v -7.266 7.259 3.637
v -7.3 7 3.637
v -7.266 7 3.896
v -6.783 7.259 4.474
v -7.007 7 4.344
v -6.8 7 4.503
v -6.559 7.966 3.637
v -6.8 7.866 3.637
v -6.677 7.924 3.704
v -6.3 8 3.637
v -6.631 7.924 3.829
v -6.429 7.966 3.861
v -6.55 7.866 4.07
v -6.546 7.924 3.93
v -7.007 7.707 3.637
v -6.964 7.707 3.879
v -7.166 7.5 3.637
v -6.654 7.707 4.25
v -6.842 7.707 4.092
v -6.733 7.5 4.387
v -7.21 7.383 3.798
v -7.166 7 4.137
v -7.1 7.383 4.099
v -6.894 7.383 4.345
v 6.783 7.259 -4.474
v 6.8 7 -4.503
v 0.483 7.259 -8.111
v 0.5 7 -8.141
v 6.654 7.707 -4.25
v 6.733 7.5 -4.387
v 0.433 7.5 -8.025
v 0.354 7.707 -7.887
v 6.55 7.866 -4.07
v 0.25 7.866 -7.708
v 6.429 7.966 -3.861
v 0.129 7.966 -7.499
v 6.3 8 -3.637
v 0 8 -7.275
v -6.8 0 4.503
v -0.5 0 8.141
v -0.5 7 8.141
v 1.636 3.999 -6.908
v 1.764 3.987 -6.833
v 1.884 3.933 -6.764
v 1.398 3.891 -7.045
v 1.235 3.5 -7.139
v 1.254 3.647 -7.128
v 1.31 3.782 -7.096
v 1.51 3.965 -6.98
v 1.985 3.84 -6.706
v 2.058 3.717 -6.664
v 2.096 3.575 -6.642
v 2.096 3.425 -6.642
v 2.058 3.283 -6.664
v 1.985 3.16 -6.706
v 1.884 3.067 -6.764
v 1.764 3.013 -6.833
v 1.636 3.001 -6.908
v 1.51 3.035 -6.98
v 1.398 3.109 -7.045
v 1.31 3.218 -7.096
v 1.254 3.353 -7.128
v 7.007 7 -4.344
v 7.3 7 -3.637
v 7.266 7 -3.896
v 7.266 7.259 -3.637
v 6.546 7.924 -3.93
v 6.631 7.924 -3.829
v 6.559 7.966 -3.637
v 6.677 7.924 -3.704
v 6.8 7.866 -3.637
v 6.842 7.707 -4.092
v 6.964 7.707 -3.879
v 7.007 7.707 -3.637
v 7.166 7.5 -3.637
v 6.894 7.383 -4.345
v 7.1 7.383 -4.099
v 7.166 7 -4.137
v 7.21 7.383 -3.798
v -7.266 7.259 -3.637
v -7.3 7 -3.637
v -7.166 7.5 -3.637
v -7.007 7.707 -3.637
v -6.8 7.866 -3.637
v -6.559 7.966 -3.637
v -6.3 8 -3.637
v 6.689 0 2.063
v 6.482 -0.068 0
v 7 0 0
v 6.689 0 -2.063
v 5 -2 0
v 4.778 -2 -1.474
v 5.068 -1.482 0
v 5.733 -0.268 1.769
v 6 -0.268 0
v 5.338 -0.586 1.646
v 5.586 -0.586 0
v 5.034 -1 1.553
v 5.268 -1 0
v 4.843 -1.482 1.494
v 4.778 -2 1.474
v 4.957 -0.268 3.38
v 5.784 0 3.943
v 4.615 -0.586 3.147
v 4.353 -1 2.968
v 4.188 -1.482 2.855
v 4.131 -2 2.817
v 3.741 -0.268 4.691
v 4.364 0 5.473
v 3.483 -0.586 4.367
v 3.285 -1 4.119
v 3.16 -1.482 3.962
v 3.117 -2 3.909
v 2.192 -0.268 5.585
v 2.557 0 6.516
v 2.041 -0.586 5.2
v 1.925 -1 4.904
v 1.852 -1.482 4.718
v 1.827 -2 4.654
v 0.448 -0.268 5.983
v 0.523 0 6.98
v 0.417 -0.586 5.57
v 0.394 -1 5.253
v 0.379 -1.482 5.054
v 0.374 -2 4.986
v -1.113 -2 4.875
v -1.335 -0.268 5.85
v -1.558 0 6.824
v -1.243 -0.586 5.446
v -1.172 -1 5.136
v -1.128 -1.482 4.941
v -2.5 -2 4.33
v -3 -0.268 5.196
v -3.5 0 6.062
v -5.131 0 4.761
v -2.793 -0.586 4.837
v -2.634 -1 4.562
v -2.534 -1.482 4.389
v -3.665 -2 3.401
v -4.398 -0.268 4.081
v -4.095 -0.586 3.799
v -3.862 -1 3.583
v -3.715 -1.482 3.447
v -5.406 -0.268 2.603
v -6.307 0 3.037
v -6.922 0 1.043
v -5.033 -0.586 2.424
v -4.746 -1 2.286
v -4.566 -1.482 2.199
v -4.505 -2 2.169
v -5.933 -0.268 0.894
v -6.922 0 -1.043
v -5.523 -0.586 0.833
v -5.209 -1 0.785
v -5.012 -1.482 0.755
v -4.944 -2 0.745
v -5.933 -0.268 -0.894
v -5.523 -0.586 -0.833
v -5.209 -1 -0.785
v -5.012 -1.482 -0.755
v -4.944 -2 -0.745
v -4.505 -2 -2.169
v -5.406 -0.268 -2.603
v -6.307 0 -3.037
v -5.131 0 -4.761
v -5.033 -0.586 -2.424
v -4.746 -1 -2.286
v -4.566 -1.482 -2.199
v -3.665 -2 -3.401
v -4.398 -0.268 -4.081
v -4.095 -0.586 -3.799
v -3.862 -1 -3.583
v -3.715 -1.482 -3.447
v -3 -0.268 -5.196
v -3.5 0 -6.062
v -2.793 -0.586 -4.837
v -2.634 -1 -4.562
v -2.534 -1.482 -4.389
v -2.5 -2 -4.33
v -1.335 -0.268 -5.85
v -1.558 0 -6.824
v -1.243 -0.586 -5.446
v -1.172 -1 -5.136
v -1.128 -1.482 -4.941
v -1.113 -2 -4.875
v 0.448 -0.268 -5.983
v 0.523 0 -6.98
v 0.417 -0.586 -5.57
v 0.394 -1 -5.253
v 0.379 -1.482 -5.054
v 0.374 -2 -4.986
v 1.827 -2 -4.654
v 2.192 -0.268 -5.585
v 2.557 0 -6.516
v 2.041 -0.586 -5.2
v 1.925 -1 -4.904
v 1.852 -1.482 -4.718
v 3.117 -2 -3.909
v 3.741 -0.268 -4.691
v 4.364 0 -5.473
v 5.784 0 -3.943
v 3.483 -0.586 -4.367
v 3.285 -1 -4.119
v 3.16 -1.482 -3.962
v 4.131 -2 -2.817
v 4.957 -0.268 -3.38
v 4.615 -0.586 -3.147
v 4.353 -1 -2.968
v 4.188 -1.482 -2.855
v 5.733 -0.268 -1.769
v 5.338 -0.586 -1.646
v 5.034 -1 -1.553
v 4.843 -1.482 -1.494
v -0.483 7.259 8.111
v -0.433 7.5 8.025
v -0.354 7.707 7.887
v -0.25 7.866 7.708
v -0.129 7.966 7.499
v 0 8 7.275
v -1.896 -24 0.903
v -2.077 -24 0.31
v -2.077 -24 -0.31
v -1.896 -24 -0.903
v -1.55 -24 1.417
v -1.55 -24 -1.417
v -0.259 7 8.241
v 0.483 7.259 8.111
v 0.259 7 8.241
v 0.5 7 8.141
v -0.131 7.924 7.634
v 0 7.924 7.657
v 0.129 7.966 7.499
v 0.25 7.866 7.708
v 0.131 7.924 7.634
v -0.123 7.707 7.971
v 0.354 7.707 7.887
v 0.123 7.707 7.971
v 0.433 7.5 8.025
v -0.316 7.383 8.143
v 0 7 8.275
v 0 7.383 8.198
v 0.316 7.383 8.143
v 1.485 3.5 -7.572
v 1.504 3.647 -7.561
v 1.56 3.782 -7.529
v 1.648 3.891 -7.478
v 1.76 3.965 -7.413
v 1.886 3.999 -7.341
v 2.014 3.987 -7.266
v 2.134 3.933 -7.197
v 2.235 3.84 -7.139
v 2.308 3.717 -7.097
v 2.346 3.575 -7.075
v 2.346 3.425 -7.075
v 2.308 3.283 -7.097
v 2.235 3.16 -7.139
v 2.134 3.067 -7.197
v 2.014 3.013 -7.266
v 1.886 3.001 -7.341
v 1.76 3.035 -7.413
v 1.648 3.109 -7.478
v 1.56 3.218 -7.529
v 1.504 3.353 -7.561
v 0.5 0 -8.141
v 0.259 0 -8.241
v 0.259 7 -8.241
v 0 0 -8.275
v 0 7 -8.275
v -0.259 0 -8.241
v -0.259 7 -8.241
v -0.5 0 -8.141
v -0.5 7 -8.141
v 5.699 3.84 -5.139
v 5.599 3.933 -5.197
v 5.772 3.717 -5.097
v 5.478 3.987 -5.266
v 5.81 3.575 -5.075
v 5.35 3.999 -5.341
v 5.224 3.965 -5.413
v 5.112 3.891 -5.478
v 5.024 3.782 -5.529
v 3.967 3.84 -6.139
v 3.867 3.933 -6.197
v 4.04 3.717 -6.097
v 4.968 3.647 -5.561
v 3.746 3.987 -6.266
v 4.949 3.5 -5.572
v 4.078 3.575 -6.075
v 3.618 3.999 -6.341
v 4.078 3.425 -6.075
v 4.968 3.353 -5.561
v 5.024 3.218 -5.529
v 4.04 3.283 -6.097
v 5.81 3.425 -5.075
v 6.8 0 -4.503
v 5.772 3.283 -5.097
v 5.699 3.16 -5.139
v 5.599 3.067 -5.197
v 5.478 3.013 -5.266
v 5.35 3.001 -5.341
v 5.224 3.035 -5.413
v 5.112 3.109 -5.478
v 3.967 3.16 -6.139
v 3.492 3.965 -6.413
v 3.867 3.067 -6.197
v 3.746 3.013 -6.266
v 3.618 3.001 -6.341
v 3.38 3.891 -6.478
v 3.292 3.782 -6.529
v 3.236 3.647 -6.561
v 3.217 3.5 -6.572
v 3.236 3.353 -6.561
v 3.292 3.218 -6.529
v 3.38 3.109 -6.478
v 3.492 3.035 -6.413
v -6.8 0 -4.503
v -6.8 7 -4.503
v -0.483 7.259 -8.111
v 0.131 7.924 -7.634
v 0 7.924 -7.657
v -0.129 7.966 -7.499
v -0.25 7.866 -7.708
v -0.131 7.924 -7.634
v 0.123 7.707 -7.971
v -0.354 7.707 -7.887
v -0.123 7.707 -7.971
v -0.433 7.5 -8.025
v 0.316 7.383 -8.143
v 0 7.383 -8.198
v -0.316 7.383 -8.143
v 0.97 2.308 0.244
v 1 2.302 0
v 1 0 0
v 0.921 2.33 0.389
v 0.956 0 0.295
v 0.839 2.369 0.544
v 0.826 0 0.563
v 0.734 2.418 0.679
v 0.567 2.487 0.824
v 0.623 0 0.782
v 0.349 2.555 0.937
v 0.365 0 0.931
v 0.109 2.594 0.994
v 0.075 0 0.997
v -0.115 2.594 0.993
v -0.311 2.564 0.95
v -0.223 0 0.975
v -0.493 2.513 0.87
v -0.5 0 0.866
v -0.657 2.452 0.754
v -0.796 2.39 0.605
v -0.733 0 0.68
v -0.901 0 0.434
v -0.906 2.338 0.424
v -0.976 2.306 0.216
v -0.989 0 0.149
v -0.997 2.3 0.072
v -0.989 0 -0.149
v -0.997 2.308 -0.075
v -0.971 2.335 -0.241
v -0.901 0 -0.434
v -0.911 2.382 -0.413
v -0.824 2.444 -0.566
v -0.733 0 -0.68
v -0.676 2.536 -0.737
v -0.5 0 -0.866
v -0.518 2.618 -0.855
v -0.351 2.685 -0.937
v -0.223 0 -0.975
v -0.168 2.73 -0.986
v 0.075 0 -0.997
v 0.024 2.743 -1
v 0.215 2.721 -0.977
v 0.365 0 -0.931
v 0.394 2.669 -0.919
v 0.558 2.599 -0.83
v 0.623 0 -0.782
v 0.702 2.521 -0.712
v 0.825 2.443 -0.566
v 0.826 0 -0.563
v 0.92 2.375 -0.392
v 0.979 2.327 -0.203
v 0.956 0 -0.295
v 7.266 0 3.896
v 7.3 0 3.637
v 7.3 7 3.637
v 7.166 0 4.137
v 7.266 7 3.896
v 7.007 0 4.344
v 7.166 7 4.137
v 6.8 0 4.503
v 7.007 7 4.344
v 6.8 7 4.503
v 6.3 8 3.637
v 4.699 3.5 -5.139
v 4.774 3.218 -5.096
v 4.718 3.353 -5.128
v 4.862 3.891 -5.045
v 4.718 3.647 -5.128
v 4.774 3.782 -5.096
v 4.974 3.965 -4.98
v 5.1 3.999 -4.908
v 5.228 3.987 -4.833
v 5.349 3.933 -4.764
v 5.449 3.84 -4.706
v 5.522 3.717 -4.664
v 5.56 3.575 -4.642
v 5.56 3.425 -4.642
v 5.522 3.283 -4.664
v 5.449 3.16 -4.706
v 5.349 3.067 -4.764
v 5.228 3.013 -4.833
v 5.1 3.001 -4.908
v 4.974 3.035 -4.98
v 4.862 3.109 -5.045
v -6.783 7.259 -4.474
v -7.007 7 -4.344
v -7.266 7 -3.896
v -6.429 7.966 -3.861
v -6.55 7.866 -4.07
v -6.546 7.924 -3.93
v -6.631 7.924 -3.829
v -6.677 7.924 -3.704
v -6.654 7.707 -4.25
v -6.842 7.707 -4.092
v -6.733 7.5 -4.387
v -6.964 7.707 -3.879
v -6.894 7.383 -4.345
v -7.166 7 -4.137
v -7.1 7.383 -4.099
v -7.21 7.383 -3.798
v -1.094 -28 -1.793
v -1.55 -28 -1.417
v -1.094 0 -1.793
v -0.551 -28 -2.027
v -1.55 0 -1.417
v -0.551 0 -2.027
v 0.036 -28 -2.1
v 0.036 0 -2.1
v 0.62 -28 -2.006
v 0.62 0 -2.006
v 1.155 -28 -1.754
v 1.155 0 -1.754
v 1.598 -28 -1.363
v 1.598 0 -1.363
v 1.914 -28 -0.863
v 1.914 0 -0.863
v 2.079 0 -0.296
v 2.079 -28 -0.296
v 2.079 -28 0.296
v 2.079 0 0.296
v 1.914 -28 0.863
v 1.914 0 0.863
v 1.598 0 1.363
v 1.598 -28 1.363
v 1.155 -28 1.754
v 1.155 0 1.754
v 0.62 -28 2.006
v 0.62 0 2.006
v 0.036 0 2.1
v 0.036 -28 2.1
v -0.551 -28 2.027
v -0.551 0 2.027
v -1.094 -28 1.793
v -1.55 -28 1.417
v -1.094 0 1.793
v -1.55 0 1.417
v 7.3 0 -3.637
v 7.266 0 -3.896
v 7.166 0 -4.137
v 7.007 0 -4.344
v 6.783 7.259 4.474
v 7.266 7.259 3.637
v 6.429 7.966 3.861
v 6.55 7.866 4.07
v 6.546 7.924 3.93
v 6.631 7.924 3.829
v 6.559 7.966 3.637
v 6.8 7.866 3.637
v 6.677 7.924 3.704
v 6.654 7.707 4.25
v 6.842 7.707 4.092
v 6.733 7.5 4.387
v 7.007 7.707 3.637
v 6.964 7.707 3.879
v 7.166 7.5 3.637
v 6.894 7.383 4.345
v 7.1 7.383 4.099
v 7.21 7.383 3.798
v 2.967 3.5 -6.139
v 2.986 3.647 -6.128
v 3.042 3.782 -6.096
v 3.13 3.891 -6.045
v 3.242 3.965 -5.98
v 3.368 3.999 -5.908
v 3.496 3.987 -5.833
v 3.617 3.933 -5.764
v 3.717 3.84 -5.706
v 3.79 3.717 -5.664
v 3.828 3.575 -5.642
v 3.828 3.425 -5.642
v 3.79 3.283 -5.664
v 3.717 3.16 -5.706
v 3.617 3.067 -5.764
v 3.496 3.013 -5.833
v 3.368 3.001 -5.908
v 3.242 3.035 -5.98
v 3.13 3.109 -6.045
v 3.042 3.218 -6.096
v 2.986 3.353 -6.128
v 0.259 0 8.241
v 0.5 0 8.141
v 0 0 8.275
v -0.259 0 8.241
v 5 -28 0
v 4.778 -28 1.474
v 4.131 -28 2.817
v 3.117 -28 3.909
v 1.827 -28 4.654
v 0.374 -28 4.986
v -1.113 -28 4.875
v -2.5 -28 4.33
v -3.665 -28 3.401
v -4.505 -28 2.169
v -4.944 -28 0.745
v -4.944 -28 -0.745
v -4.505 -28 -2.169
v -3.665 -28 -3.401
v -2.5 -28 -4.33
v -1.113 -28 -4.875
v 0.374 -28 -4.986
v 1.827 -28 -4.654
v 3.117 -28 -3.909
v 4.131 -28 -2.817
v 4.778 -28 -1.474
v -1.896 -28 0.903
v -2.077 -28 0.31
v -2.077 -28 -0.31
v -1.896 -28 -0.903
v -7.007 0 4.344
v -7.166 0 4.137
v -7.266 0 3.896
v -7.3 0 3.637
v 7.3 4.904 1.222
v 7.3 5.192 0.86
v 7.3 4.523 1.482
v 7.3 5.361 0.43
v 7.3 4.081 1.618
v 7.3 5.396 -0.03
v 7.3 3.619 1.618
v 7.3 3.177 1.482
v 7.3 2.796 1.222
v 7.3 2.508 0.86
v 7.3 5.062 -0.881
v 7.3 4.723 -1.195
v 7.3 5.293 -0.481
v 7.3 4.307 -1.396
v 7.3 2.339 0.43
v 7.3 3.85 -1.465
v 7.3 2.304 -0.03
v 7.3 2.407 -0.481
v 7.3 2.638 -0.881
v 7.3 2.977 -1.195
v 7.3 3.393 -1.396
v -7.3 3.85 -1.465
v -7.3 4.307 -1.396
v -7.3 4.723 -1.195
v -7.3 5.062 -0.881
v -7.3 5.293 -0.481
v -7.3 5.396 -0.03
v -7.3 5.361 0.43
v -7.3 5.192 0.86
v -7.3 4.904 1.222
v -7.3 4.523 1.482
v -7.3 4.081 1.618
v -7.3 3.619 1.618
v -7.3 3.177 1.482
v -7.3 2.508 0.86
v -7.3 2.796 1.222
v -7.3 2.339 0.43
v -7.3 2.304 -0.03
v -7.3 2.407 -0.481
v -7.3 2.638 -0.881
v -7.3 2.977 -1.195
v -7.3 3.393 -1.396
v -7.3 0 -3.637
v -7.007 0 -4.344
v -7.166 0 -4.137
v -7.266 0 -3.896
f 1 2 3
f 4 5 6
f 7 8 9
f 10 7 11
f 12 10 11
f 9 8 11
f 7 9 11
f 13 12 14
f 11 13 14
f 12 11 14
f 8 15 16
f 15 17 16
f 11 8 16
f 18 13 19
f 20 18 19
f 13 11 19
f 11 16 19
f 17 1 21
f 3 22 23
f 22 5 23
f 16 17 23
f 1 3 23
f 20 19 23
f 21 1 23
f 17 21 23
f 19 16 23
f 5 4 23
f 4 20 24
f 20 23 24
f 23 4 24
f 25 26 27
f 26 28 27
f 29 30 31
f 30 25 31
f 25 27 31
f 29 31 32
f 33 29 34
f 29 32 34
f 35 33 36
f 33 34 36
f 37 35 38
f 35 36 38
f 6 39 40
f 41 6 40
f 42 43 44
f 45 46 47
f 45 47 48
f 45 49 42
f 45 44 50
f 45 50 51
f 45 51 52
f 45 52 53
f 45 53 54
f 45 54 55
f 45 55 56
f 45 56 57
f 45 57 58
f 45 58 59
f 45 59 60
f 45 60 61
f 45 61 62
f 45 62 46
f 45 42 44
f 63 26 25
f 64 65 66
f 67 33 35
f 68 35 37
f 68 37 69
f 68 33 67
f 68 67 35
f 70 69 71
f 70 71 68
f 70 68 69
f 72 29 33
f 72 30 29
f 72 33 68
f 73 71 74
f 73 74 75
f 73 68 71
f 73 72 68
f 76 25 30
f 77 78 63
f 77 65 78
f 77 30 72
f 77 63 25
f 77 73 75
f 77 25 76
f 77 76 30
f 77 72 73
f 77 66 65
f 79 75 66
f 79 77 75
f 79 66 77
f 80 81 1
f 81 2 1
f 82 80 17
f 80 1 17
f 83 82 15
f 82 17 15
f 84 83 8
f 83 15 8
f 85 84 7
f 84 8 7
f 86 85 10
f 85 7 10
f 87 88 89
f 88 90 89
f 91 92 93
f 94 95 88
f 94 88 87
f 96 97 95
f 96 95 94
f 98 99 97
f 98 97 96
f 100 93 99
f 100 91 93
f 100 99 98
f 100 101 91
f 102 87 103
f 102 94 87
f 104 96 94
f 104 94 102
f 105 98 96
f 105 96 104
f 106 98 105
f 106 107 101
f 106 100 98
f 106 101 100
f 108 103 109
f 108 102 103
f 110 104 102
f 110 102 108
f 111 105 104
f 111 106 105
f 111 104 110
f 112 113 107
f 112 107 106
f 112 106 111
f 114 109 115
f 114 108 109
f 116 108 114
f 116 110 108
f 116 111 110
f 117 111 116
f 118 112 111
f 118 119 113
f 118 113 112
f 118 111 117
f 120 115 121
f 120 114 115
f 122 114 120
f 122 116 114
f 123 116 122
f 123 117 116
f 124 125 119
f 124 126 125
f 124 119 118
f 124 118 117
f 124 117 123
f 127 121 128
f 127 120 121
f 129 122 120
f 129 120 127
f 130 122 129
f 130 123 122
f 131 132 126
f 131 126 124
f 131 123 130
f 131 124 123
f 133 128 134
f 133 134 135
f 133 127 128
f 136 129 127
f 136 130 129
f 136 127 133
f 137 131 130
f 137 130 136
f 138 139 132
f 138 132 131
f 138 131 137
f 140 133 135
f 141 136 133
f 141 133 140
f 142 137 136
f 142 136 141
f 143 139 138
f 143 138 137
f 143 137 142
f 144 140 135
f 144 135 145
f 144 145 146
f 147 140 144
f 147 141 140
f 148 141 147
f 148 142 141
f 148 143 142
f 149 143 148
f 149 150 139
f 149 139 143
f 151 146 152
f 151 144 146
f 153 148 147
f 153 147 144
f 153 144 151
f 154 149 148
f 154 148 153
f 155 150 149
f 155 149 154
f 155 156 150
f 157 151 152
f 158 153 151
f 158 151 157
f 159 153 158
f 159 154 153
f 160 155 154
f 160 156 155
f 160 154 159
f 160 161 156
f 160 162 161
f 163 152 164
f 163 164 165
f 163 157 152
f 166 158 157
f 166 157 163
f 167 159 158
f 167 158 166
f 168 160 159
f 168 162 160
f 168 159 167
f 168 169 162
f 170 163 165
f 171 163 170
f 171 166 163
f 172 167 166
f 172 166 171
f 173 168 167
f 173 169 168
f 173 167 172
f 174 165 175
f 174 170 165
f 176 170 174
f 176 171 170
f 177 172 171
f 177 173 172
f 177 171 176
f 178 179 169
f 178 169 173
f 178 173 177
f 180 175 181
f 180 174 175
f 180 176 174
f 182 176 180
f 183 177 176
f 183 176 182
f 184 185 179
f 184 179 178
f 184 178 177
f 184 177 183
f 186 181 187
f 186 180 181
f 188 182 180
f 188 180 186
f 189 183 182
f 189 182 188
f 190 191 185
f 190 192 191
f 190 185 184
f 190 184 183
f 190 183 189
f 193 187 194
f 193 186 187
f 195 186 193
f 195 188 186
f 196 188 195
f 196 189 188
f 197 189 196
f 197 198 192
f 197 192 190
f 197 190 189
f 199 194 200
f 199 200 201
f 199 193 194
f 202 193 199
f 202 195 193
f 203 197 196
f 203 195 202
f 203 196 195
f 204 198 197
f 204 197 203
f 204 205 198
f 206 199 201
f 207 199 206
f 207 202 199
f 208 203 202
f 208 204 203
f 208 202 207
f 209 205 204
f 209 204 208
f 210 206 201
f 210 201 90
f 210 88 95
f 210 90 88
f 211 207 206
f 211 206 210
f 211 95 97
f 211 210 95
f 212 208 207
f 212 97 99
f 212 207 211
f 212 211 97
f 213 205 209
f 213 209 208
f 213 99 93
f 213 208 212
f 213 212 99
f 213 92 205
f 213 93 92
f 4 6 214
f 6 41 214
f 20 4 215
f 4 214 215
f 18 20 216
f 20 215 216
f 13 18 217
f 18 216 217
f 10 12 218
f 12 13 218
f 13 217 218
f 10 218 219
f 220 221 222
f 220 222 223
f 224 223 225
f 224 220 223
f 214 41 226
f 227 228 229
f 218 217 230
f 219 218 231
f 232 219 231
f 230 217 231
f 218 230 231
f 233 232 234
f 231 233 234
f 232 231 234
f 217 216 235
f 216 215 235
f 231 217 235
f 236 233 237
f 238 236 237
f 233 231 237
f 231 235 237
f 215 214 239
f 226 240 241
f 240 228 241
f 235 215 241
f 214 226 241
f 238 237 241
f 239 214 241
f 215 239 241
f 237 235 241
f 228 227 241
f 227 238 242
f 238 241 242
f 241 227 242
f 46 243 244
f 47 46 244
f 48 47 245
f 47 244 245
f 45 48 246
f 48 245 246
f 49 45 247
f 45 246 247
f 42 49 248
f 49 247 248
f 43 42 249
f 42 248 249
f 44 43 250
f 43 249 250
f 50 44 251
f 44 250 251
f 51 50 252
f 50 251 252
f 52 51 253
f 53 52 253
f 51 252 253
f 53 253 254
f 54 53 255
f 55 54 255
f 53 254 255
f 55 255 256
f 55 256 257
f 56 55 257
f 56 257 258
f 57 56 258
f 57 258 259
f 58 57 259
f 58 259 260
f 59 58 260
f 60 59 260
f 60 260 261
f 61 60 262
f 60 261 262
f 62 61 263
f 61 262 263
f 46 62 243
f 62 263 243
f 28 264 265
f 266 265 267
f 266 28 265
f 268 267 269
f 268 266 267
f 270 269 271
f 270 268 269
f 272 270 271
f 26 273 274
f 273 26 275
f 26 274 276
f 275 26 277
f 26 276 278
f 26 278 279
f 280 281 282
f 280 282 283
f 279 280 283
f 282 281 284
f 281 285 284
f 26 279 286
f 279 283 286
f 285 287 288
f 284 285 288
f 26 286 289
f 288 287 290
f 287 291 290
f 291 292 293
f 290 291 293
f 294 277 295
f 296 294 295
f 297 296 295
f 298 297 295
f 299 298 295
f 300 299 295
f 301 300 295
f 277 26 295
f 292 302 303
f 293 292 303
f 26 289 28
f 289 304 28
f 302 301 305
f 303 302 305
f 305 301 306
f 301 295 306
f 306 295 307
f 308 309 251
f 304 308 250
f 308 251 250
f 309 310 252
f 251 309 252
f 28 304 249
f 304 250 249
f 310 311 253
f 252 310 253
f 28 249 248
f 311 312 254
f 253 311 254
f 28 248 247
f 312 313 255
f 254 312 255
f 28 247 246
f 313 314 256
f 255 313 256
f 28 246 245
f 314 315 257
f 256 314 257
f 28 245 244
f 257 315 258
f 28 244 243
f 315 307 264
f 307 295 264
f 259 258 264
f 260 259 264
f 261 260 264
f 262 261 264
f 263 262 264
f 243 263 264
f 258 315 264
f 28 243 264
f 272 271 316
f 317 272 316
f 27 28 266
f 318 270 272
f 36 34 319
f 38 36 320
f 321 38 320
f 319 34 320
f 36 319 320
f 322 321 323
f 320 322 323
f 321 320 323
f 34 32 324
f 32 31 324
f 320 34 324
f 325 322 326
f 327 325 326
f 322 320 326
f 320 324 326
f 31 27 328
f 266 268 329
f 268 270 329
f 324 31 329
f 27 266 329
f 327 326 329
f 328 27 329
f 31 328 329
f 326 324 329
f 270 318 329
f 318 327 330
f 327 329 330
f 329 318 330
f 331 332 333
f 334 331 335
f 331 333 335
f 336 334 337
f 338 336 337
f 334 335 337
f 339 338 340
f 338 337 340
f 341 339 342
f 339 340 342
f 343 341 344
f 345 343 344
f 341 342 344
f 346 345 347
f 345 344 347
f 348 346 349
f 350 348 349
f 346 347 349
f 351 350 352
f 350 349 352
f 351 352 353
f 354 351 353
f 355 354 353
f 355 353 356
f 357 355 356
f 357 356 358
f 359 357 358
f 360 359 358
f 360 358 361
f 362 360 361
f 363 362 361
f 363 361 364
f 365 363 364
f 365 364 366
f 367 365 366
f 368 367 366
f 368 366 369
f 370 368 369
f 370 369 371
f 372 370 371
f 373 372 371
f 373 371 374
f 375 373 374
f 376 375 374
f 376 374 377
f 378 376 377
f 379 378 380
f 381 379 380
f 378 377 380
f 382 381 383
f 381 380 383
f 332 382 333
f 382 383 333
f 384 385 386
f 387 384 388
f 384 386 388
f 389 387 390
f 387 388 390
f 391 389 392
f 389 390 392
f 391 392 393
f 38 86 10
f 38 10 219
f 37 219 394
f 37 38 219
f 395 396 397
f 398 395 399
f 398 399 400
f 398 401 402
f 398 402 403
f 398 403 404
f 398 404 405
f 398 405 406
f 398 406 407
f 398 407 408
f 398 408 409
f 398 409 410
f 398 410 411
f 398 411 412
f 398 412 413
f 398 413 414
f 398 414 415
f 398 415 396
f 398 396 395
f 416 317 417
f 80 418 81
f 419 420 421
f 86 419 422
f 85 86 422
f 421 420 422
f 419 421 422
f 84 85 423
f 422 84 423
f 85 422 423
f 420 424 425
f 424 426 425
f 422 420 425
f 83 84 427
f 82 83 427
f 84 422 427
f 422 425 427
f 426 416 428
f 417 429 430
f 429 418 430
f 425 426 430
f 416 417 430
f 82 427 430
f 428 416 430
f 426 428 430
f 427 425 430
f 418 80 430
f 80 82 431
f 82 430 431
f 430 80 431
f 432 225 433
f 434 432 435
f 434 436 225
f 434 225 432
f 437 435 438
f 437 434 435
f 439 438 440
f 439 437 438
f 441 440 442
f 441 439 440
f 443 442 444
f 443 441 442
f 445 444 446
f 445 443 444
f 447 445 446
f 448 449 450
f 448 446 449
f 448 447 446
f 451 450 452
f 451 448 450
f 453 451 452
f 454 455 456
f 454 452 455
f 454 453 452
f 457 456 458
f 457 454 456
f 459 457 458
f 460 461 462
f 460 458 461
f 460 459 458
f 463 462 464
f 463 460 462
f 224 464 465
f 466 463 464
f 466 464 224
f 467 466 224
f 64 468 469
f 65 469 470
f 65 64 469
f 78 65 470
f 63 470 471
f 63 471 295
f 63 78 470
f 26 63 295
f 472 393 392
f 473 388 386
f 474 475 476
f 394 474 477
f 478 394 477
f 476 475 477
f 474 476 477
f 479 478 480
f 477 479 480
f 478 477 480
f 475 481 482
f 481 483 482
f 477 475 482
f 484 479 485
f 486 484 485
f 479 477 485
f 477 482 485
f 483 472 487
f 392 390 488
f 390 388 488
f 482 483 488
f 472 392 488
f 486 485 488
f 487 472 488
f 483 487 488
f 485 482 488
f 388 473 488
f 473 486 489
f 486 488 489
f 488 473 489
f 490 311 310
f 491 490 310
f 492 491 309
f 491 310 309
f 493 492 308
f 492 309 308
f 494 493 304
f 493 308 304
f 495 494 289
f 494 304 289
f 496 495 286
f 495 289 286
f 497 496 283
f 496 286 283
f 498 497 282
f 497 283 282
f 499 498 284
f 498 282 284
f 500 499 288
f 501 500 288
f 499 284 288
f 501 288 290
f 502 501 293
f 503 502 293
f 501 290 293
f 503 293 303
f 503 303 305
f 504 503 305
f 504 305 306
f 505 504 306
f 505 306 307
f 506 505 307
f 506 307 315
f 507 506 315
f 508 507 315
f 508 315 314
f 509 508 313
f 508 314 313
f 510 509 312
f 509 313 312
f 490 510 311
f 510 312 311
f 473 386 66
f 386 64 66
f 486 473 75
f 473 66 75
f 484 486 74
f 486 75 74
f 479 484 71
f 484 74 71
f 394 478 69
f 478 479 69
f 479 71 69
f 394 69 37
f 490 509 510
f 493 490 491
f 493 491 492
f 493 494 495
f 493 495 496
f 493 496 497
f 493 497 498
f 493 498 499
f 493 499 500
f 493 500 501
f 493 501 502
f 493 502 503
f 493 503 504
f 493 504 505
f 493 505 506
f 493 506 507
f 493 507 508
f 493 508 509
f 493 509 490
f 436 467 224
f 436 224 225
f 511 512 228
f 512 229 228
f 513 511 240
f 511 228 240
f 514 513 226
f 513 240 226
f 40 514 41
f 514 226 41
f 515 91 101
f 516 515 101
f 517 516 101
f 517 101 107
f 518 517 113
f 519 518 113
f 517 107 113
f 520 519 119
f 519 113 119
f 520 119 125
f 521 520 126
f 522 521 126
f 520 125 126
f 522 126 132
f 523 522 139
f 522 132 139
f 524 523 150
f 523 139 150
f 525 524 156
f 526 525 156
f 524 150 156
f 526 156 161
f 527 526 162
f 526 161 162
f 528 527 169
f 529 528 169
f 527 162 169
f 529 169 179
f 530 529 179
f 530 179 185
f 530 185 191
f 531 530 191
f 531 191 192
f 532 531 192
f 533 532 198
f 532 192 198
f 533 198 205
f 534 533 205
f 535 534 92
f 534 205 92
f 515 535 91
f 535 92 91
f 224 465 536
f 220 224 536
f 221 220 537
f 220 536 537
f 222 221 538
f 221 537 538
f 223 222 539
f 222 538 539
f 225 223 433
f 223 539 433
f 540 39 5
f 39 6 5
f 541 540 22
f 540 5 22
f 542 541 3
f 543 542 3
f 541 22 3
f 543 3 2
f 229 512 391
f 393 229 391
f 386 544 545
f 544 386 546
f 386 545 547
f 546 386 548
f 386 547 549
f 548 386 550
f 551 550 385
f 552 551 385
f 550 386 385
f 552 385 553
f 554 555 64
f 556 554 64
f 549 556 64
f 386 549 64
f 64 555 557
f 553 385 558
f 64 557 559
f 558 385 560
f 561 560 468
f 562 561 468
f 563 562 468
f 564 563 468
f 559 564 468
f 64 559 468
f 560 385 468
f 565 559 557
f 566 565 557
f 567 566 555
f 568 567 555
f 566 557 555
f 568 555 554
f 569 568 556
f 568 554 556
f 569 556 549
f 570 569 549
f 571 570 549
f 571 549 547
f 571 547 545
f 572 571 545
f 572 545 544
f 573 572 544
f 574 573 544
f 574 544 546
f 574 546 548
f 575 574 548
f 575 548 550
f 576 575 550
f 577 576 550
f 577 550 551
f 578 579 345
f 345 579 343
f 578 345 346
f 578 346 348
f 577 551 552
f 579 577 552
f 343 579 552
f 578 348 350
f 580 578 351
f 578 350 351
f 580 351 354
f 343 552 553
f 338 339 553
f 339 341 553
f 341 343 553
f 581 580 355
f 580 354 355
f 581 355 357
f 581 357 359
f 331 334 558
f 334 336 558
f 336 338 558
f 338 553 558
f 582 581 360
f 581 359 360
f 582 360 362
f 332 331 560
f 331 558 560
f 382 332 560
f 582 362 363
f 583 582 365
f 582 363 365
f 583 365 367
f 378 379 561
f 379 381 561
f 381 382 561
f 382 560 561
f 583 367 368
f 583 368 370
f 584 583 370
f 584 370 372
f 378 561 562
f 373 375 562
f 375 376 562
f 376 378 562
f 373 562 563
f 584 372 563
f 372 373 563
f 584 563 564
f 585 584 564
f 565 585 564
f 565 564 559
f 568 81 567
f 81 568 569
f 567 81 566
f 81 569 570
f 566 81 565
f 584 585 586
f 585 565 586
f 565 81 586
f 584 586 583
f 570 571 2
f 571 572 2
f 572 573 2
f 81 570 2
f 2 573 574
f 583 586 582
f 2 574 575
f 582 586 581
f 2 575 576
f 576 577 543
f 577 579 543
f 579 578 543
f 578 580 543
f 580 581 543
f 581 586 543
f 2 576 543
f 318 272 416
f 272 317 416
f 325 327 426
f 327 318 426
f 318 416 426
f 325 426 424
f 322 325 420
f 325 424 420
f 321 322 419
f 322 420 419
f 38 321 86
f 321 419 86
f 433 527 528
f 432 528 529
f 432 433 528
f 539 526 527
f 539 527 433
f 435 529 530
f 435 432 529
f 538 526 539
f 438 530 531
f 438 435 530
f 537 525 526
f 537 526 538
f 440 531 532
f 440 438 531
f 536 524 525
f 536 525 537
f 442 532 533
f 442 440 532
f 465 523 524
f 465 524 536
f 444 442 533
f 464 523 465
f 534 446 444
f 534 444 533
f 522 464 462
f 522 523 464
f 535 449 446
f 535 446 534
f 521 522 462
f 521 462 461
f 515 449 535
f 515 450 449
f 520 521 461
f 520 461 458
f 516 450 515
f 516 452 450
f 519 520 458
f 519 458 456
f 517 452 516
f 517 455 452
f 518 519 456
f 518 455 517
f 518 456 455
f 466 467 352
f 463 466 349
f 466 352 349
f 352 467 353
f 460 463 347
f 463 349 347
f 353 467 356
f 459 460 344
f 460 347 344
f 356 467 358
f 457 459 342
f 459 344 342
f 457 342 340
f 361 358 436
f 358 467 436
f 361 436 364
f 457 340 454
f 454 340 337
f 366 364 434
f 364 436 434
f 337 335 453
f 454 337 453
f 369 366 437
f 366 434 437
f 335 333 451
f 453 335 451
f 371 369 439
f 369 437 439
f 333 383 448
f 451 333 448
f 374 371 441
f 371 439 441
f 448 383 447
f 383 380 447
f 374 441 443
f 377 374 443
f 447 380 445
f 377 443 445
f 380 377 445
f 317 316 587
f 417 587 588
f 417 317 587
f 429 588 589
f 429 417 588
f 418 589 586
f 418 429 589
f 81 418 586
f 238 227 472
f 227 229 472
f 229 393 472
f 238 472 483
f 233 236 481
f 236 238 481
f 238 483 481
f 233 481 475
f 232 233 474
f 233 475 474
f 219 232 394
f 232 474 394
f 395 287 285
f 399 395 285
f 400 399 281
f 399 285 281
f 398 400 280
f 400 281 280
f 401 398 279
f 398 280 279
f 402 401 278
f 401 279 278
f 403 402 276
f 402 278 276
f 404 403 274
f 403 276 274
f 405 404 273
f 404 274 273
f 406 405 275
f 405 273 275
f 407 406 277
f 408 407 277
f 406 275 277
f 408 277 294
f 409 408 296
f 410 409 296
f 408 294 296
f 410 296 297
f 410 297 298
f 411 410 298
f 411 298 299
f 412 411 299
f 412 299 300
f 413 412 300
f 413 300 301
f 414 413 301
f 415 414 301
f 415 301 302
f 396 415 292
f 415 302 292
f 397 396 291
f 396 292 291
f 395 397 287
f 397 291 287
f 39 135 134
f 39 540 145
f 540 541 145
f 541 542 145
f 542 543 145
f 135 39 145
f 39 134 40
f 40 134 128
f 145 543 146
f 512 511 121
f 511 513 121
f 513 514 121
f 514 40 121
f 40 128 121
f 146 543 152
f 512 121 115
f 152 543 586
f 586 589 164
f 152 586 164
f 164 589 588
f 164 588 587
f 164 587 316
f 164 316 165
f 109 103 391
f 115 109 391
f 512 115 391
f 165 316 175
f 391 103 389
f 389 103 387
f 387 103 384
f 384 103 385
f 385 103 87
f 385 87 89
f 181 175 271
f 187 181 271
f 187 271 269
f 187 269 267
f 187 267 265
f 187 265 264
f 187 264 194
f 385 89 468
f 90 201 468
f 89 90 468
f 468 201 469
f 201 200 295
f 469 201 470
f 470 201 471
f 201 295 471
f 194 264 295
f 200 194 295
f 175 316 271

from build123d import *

# Parameters (mm, degrees)
BOSS_EXTRUDE1_DEPTH     = 8
SKETCH2_R               = 5
BOSS_EXTRUDE2_DEPTH     = 28
FILLET1_R               = 2
SKETCH3_R               = 1.55
CUT_EXTRUDE1_DEPTH      = 33.683533061
FILLET2_R               = 1
CUT_EXTRUDE3_START      = -4
SKETCH5_R               = 2.1
CUT_EXTRUDE3_DEPTH      = 4
SKETCH6_R               = 0.5
CUT_EXTRUDE4_DEPTH      = 0.5
CUT_EXTRUDE5_REACH      = 32.096
CUT_EXTRUDE5_END_RADIUS = 1.55
SKETCH7_R               = 1


with BuildPart() as part:
    # Sketch1 → Boss-Extrude1 (new body)
    with BuildSketch(Plane(origin=(0, 0, 0), x_dir=(1, 0, 0), z_dir=(0, 1, 0))):
        Polygon((7.3, -4.214656965), (7.3, 4.214656965), (0, 8.42931393), (-7.3, 4.214656965), (-7.3, -4.214656965), (0, -8.42931393), align=None)
    extrude(amount=BOSS_EXTRUDE1_DEPTH)

    # Sketch2 → Boss-Extrude2 (add)
    with BuildSketch(Plane.XZ):
        Circle(SKETCH2_R)
        with BuildLine():
            Line((-1.55, 1.416862732), (-1.55, -1.416862732))
            ThreePointArc((-1.55, -1.416862732), (2.1, 0), (-1.55, 1.416862732))
        make_face(mode=Mode.SUBTRACT)
    extrude(amount=BOSS_EXTRUDE2_DEPTH)

    # Fillet1
    fillet1_edges = [part.edges().sort_by_distance(p)[0] for p in [
        (-5, 0, 0),
    ]]
    fillet(fillet1_edges, radius=FILLET1_R)

    # Sketch3 → Cut-Extrude1 (cut, through all)
    with BuildSketch(Plane(origin=(7.3, 0, 0), x_dir=(0, 0, -1), z_dir=(1, 0, 0))):
        with Locations((-0.085343035, 3.85)):
            Circle(SKETCH3_R)
    extrude(amount=-CUT_EXTRUDE1_DEPTH, mode=Mode.SUBTRACT)

    # Fillet2
    fillet2_edges = [part.edges().sort_by_distance(p)[0] for p in [
        (-3.65, 8, 6.321985448),
        (-7.3, 8, 0),
        (-3.65, 8, -6.321985448),
        (3.65, 8, -6.321985448),
        (7.3, 8, 0),
        (3.65, 8, 6.321985448),
        (-7.3, 4, -4.214656965),
        (0, 4, -8.42931393),
        (7.3, 4, -4.214656965),
        (7.3, 4, 4.214656965),
        (0, 4, 8.42931393),
        (-7.3, 4, 4.214656965),
    ]]
    fillet(fillet2_edges, radius=FILLET2_R)

    # Sketch5 → Cut-Extrude3 (cut)
    with BuildSketch(Plane.XZ.offset(28).offset(CUT_EXTRUDE3_START)):
        Circle(SKETCH5_R)
    extrude(amount=CUT_EXTRUDE3_DEPTH, mode=Mode.SUBTRACT)

    # Sketch6 → Cut-Extrude4 (cut)
    with BuildSketch(Plane(origin=(3.65, 0, -6.321985448), x_dir=(-0.8660254037844388, 0, -0.49999999999999967), z_dir=(0.49999999999999967, 0, -0.8660254037844388))):
        with Locations((0, 3.5)):
            Circle(SKETCH6_R)
        with Locations((-2, 3.5)):
            Circle(SKETCH6_R)
        with Locations((2, 3.5)):
            Circle(SKETCH6_R)
    extrude(amount=-CUT_EXTRUDE4_DEPTH, mode=Mode.SUBTRACT)

    # Cut-Extrude5: up to this cylinder (the profile starts outside it)
    cut_extrude5_end = Plane(origin=(0, 3.85, 0.085343035), z_dir=(1, 0, 0)) * Cylinder(CUT_EXTRUDE5_END_RADIUS, 68.292, mode=Mode.PRIVATE)
    # Sketch7 → Cut-Extrude5 (cut, up to the surface)
    with BuildSketch(Plane.XZ, mode=Mode.PRIVATE) as cut_extrude5_sk1:
        Circle(SKETCH7_R)
    cut_extrude5_tool1 = extrude(cut_extrude5_sk1.sketch, amount=-CUT_EXTRUDE5_REACH, mode=Mode.PRIVATE) - cut_extrude5_end
    add(cut_extrude5_tool1.solids().sort_by_distance((0, 0, 0))[0], mode=Mode.SUBTRACT)


solid = part.part
